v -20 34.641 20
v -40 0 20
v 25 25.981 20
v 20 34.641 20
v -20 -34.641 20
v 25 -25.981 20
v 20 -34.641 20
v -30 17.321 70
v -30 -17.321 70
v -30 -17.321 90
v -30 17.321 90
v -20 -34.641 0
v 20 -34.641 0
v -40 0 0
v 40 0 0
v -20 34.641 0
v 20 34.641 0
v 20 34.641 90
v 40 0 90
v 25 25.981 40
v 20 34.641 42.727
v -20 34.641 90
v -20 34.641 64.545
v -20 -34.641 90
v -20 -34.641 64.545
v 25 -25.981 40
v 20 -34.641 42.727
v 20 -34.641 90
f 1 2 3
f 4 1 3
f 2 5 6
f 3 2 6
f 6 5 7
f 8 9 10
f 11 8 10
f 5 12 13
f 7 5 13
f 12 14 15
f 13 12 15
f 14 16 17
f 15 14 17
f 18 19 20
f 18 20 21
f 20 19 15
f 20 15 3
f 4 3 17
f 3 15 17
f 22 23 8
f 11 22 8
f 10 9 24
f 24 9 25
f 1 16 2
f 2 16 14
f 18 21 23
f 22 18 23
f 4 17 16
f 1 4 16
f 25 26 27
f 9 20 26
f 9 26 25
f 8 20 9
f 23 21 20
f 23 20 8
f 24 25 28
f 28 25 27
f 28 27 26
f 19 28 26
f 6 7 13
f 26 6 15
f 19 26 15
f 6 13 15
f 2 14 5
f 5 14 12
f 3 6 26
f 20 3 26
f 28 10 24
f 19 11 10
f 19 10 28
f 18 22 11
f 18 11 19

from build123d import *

# Parameters (mm, degrees)
F1_DEPTH      = 90
F3_DEPTH      = 34.6420161514
F3_DEPTH_BACK = 34.6420161514


with BuildPart() as f1:
    # F0 (on Top) → F1 (new body)
    with BuildSketch(Plane.XY):
        Polygon((-20, 34.6410161514), (-40, 0), (-20, -34.6410161514), (20, -34.6410161514), (40, 0), (20, 34.6410161514), align=None)
    extrude(amount=F1_DEPTH)

    # F2 (on Front) → F3 (cut, two sides)
    with BuildSketch(Plane.XZ) as f3_sk:
        Polygon((-43.1388012565, 92.6622778185), (-43.1388012565, 20), (25, 20), (25, 40), (-30, 70), (-30, 92.6622778185), align=None)
    extrude(amount=-F3_DEPTH, mode=Mode.SUBTRACT)
    extrude(f3_sk.sketch, amount=F3_DEPTH_BACK, mode=Mode.SUBTRACT)


solid = f1.part
